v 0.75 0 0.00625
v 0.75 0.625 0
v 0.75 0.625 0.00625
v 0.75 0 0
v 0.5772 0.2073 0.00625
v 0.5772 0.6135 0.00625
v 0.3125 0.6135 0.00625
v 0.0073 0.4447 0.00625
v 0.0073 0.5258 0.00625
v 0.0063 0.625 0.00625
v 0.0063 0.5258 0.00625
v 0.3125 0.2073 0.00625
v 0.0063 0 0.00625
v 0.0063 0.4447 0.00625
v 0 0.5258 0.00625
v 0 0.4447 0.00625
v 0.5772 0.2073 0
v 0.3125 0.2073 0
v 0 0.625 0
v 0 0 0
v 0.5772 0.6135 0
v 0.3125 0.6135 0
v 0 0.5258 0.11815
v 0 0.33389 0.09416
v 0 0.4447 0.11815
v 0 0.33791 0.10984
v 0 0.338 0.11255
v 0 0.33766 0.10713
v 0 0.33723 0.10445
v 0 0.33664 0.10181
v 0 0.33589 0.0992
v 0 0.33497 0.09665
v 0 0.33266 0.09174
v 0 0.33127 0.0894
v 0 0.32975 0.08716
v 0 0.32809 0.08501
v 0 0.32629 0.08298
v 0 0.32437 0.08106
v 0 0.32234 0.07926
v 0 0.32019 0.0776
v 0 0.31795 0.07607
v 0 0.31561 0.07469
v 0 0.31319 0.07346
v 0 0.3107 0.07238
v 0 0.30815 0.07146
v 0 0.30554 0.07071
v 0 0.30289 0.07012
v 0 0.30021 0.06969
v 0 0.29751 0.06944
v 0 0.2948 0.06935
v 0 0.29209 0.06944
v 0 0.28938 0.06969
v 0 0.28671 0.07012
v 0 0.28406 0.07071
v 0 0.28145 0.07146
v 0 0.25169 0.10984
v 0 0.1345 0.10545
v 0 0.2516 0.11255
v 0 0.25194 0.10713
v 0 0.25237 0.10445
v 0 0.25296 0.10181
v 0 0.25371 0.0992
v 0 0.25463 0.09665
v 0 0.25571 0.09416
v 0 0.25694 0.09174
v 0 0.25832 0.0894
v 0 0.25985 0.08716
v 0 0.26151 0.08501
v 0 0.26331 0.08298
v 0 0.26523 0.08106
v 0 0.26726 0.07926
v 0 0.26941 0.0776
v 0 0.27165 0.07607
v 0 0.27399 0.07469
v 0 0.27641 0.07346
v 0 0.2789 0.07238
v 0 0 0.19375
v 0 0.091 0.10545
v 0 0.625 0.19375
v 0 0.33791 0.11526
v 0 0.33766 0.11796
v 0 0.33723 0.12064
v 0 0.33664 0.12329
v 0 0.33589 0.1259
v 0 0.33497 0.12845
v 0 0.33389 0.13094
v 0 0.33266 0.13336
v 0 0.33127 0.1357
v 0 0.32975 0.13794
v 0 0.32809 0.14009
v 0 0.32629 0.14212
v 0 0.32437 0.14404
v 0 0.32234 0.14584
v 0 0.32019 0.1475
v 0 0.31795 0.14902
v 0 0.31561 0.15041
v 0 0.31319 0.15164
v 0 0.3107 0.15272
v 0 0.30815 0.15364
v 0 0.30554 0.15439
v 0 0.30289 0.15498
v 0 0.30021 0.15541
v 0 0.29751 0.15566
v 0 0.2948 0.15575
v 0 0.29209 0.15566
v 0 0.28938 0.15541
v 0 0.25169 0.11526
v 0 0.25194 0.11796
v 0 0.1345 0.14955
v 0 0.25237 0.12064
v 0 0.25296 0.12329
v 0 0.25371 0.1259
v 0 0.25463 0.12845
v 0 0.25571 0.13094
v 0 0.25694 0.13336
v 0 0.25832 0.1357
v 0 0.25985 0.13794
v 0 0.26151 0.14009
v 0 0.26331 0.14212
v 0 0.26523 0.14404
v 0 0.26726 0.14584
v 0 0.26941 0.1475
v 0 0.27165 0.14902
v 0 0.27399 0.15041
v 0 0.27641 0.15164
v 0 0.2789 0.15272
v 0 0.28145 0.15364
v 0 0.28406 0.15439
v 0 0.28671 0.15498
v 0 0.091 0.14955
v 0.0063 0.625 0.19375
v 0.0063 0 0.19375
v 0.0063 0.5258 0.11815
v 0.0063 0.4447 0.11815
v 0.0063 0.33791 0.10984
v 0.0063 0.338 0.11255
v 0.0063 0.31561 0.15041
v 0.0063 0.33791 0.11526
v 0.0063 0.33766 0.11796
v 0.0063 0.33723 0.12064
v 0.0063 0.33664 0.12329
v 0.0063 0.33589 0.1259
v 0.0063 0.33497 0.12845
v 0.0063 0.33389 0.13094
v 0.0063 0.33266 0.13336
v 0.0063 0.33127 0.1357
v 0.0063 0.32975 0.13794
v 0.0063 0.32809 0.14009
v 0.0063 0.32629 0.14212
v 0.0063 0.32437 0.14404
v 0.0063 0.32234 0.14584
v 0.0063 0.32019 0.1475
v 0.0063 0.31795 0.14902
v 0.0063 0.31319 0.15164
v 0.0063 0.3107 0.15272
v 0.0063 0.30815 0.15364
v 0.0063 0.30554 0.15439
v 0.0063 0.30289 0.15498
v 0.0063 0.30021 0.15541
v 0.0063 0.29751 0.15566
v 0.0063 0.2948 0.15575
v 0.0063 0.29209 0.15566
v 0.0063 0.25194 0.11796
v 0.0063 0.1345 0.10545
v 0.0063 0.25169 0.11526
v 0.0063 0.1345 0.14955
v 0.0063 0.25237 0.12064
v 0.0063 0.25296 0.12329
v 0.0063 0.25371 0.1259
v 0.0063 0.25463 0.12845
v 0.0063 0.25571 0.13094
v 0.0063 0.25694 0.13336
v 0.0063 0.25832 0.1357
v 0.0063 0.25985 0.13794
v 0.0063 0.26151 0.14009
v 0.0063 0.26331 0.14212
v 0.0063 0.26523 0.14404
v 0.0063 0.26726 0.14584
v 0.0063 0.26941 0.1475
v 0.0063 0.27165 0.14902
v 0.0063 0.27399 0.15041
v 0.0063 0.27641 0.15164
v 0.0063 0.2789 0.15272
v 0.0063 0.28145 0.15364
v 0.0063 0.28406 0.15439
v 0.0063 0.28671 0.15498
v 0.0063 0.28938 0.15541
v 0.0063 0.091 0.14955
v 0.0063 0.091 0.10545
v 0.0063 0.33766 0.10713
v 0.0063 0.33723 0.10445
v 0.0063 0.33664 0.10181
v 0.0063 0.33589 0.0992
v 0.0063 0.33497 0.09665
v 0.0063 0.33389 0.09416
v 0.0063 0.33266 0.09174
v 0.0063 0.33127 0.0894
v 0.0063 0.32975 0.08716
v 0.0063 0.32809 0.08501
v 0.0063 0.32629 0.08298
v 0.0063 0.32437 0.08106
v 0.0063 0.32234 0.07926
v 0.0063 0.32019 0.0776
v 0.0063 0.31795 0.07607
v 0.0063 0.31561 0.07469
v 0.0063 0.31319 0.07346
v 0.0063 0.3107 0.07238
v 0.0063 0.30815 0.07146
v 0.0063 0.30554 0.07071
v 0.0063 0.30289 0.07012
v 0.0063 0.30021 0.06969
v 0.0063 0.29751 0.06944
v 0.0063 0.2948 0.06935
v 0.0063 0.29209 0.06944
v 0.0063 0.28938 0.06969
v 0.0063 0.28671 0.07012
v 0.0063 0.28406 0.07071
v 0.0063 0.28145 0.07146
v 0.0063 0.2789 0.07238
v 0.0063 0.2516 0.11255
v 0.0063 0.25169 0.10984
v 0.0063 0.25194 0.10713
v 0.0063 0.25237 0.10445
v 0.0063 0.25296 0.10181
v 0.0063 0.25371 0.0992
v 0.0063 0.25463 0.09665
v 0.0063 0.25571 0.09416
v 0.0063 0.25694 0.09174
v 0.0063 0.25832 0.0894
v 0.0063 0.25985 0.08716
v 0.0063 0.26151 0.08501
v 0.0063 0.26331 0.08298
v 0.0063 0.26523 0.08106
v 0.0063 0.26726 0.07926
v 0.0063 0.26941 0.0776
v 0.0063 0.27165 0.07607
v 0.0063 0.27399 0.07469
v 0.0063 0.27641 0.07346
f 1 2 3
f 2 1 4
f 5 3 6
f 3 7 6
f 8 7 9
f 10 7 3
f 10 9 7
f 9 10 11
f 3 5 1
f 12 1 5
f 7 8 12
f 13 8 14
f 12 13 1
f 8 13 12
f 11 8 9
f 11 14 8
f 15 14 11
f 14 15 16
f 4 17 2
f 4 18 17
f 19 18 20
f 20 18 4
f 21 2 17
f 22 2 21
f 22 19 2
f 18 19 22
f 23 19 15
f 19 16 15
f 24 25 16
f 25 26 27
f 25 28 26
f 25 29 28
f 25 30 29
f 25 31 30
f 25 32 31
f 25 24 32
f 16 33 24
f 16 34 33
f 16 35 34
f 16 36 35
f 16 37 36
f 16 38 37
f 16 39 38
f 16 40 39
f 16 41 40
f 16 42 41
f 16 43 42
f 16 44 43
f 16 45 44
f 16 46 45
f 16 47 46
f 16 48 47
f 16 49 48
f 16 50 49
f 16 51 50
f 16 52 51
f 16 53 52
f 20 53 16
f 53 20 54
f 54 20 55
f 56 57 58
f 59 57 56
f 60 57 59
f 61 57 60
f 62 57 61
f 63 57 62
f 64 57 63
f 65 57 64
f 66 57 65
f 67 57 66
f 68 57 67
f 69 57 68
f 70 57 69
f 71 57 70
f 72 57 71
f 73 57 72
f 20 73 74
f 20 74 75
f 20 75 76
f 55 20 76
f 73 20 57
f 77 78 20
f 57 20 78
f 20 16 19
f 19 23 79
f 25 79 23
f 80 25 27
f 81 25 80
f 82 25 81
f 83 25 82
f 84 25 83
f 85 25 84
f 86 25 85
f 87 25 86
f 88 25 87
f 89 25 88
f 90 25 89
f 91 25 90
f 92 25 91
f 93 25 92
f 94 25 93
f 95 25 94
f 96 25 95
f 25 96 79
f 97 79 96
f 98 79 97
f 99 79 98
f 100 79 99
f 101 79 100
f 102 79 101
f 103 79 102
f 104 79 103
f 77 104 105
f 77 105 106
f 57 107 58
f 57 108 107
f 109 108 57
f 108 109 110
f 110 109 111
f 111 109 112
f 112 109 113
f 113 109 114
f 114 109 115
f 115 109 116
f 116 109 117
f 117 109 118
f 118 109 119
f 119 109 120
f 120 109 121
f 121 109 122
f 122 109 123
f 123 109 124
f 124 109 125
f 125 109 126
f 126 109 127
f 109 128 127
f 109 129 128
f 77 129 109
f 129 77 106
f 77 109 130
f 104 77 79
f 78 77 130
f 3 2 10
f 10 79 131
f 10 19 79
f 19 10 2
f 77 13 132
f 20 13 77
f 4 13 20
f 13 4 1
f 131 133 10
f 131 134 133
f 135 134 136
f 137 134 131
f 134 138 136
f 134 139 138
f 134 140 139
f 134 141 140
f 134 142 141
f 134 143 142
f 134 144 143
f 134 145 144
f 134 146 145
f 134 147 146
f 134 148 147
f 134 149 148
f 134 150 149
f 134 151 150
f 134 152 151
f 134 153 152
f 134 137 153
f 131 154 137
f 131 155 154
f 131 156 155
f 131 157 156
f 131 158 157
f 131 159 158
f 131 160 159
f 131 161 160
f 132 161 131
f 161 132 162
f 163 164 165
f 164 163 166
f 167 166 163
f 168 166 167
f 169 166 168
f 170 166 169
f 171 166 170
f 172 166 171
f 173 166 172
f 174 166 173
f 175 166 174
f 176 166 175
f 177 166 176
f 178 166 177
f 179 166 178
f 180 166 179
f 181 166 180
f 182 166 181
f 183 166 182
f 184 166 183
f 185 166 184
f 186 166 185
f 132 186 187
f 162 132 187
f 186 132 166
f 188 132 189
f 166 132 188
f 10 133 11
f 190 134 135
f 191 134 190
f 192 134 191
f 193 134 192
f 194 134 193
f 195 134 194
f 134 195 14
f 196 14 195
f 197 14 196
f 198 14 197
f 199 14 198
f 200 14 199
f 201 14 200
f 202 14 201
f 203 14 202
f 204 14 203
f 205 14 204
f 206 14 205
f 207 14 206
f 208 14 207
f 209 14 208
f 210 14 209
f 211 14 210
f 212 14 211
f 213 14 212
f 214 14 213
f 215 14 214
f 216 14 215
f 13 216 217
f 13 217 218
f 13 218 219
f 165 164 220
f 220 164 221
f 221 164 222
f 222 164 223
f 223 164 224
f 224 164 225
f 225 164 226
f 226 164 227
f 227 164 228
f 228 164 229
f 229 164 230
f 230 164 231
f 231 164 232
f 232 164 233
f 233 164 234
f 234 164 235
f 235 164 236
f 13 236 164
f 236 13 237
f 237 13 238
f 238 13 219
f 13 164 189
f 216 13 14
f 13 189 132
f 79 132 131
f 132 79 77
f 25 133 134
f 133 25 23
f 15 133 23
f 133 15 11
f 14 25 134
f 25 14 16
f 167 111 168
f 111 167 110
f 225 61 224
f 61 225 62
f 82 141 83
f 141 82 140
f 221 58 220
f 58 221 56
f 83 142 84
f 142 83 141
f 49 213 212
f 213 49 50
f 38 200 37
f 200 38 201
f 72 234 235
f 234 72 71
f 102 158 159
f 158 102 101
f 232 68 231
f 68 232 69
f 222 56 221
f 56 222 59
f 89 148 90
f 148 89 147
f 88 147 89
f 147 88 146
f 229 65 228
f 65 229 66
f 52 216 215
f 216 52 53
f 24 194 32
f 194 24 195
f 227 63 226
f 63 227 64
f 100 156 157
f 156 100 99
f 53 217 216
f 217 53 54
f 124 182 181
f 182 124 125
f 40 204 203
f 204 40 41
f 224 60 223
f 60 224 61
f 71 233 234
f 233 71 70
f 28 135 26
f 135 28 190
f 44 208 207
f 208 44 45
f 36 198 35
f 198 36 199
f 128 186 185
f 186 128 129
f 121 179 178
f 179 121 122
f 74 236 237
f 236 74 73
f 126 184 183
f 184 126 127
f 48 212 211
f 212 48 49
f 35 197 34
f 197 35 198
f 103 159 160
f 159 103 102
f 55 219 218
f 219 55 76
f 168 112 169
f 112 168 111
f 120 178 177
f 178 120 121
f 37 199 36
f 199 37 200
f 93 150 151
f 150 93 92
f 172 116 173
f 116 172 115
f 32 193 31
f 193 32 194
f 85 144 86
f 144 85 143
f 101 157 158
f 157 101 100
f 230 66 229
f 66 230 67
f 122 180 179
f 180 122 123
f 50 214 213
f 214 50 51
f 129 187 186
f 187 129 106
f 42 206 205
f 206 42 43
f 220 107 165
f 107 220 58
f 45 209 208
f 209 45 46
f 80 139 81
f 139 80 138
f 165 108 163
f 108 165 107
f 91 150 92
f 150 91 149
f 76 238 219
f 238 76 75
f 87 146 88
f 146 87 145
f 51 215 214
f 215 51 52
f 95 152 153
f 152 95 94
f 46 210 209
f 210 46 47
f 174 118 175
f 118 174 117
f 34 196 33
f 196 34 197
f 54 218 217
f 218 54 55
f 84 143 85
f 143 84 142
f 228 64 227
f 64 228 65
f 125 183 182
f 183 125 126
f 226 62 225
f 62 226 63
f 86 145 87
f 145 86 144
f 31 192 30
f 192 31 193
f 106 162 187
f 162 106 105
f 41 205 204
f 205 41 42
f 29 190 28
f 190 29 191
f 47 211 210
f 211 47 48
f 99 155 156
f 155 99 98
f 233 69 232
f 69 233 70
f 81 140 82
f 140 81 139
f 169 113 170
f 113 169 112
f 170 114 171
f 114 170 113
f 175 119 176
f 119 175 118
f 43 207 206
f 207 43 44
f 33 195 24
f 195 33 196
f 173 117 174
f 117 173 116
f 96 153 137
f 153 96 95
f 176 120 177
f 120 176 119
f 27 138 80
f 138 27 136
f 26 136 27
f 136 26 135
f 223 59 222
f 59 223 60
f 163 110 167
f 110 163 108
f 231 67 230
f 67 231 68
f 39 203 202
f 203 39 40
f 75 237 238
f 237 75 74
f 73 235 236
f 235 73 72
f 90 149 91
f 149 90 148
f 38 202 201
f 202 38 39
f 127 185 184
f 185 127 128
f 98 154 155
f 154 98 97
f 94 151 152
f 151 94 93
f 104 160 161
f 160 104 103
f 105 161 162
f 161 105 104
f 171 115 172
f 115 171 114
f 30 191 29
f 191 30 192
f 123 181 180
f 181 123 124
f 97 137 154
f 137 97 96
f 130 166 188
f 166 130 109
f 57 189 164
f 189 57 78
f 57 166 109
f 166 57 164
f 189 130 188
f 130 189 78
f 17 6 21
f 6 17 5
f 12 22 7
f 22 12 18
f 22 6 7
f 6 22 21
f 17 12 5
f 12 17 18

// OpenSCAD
// Parametric Model of Rectangular Base with Upright Wall and Cutouts
// All dimensions in millimeters

// --- PARAMETERS ---
// Base dimensions
base_length = 0.75;
base_width = 0.625;
base_height = 0.00625;

// Wall dimensions
wall_thickness = 0.0063;
wall_width = 0.625;
wall_height_above_base = 0.1875;
wall_total_height = 0.1938;  // From base datum

// Lower rectangular opening in wall
lower_opening_width = 0.081103;
lower_opening_height = 0.111891;
lower_opening_front_offset = 0.4447;
lower_opening_back_offset = 0.0992;
lower_opening_z_start = 0;
lower_opening_z_end = 0.1119;

// Circular through-hole in wall
hole_radius = 0.0432;
hole_front_offset = 0.2948;
hole_z_start = 0.0631;
hole_z_end = 0.1495;
hole_cut_depth = 0.0625;

// Smaller rectangular opening in wall
small_opening_width = 0.043521;
small_opening_height = 0.044108;
small_opening_front_offset = 0.091;
small_opening_back_offset = 0.4905;
small_opening_z_start = 0.0992;
small_opening_z_end = 0.1433;
small_opening_cut_depth = 0.0625;

// Base rectangular opening
base_opening_length = 0.264669;
base_opening_width = 0.40625;
base_opening_left_offset = 0.3125;
base_opening_right_offset = 0.1728;
base_opening_front_offset = 0.2073;
base_opening_back_offset = 0.0115;
base_opening_z_start = -0.0562;
base_opening_z_end = 0.0063;

// Resolution for curved surfaces
$fn = 100;

// --- MODULES ---

// Main rectangular base
module base() {
    cube([base_length, base_width, base_height]);
}

// Upright wall along left edge
module wall() {
    translate([0, 0, base_height])
        cube([wall_thickness, wall_width, wall_height_above_base]);
}

// Lower rectangular opening in wall
module lower_wall_opening() {
    // Calculate position based on offsets
    y_pos = lower_opening_front_offset;
    width = wall_width - lower_opening_front_offset - lower_opening_back_offset;
    height = lower_opening_z_end - lower_opening_z_start;
    
    translate([-0.001, y_pos, base_height + lower_opening_z_start])
        cube([wall_thickness + 0.002, width, height]);
}

// Circular through-hole in wall
module circular_hole() {
    // Position at center of wall thickness, based on offsets
    y_pos = hole_front_offset;
    z_center = (hole_z_start + hole_z_end) / 2;
    
    translate([-hole_cut_depth/2, y_pos, base_height + z_center])
        rotate([0, 90, 0])
            cylinder(h = hole_cut_depth, r = hole_radius);
}

// Smaller rectangular opening in wall
module small_wall_opening() {
    // Calculate position based on offsets
    y_pos = small_opening_front_offset;
    width = wall_width - small_opening_front_offset - small_opening_back_offset;
    height = small_opening_z_end - small_opening_z_start;
    
    translate([-small_opening_cut_depth/2, y_pos, base_height + small_opening_z_start])
        cube([small_opening_cut_depth, width, height]);
}

// Rectangular opening in base
module base_opening() {
    // Calculate position based on offsets
    x_pos = base_opening_left_offset;
    y_pos = base_opening_front_offset;
    length = base_length - base_opening_left_offset - base_opening_right_offset;
    width = base_width - base_opening_front_offset - base_opening_back_offset;
    height = base_opening_z_end - base_opening_z_start;
    
    translate([x_pos, y_pos, base_opening_z_start])
        cube([length, width, height]);
}

// --- MAIN MODEL ---
// Start with base and wall, then subtract all openings
difference() {
    // Combine base and wall
    union() {
        base();
        wall();
    }
    
    // Subtract wall openings
    lower_wall_opening();
    circular_hole();
    small_wall_opening();
    
    // Subtract base opening
    base_opening();
}
